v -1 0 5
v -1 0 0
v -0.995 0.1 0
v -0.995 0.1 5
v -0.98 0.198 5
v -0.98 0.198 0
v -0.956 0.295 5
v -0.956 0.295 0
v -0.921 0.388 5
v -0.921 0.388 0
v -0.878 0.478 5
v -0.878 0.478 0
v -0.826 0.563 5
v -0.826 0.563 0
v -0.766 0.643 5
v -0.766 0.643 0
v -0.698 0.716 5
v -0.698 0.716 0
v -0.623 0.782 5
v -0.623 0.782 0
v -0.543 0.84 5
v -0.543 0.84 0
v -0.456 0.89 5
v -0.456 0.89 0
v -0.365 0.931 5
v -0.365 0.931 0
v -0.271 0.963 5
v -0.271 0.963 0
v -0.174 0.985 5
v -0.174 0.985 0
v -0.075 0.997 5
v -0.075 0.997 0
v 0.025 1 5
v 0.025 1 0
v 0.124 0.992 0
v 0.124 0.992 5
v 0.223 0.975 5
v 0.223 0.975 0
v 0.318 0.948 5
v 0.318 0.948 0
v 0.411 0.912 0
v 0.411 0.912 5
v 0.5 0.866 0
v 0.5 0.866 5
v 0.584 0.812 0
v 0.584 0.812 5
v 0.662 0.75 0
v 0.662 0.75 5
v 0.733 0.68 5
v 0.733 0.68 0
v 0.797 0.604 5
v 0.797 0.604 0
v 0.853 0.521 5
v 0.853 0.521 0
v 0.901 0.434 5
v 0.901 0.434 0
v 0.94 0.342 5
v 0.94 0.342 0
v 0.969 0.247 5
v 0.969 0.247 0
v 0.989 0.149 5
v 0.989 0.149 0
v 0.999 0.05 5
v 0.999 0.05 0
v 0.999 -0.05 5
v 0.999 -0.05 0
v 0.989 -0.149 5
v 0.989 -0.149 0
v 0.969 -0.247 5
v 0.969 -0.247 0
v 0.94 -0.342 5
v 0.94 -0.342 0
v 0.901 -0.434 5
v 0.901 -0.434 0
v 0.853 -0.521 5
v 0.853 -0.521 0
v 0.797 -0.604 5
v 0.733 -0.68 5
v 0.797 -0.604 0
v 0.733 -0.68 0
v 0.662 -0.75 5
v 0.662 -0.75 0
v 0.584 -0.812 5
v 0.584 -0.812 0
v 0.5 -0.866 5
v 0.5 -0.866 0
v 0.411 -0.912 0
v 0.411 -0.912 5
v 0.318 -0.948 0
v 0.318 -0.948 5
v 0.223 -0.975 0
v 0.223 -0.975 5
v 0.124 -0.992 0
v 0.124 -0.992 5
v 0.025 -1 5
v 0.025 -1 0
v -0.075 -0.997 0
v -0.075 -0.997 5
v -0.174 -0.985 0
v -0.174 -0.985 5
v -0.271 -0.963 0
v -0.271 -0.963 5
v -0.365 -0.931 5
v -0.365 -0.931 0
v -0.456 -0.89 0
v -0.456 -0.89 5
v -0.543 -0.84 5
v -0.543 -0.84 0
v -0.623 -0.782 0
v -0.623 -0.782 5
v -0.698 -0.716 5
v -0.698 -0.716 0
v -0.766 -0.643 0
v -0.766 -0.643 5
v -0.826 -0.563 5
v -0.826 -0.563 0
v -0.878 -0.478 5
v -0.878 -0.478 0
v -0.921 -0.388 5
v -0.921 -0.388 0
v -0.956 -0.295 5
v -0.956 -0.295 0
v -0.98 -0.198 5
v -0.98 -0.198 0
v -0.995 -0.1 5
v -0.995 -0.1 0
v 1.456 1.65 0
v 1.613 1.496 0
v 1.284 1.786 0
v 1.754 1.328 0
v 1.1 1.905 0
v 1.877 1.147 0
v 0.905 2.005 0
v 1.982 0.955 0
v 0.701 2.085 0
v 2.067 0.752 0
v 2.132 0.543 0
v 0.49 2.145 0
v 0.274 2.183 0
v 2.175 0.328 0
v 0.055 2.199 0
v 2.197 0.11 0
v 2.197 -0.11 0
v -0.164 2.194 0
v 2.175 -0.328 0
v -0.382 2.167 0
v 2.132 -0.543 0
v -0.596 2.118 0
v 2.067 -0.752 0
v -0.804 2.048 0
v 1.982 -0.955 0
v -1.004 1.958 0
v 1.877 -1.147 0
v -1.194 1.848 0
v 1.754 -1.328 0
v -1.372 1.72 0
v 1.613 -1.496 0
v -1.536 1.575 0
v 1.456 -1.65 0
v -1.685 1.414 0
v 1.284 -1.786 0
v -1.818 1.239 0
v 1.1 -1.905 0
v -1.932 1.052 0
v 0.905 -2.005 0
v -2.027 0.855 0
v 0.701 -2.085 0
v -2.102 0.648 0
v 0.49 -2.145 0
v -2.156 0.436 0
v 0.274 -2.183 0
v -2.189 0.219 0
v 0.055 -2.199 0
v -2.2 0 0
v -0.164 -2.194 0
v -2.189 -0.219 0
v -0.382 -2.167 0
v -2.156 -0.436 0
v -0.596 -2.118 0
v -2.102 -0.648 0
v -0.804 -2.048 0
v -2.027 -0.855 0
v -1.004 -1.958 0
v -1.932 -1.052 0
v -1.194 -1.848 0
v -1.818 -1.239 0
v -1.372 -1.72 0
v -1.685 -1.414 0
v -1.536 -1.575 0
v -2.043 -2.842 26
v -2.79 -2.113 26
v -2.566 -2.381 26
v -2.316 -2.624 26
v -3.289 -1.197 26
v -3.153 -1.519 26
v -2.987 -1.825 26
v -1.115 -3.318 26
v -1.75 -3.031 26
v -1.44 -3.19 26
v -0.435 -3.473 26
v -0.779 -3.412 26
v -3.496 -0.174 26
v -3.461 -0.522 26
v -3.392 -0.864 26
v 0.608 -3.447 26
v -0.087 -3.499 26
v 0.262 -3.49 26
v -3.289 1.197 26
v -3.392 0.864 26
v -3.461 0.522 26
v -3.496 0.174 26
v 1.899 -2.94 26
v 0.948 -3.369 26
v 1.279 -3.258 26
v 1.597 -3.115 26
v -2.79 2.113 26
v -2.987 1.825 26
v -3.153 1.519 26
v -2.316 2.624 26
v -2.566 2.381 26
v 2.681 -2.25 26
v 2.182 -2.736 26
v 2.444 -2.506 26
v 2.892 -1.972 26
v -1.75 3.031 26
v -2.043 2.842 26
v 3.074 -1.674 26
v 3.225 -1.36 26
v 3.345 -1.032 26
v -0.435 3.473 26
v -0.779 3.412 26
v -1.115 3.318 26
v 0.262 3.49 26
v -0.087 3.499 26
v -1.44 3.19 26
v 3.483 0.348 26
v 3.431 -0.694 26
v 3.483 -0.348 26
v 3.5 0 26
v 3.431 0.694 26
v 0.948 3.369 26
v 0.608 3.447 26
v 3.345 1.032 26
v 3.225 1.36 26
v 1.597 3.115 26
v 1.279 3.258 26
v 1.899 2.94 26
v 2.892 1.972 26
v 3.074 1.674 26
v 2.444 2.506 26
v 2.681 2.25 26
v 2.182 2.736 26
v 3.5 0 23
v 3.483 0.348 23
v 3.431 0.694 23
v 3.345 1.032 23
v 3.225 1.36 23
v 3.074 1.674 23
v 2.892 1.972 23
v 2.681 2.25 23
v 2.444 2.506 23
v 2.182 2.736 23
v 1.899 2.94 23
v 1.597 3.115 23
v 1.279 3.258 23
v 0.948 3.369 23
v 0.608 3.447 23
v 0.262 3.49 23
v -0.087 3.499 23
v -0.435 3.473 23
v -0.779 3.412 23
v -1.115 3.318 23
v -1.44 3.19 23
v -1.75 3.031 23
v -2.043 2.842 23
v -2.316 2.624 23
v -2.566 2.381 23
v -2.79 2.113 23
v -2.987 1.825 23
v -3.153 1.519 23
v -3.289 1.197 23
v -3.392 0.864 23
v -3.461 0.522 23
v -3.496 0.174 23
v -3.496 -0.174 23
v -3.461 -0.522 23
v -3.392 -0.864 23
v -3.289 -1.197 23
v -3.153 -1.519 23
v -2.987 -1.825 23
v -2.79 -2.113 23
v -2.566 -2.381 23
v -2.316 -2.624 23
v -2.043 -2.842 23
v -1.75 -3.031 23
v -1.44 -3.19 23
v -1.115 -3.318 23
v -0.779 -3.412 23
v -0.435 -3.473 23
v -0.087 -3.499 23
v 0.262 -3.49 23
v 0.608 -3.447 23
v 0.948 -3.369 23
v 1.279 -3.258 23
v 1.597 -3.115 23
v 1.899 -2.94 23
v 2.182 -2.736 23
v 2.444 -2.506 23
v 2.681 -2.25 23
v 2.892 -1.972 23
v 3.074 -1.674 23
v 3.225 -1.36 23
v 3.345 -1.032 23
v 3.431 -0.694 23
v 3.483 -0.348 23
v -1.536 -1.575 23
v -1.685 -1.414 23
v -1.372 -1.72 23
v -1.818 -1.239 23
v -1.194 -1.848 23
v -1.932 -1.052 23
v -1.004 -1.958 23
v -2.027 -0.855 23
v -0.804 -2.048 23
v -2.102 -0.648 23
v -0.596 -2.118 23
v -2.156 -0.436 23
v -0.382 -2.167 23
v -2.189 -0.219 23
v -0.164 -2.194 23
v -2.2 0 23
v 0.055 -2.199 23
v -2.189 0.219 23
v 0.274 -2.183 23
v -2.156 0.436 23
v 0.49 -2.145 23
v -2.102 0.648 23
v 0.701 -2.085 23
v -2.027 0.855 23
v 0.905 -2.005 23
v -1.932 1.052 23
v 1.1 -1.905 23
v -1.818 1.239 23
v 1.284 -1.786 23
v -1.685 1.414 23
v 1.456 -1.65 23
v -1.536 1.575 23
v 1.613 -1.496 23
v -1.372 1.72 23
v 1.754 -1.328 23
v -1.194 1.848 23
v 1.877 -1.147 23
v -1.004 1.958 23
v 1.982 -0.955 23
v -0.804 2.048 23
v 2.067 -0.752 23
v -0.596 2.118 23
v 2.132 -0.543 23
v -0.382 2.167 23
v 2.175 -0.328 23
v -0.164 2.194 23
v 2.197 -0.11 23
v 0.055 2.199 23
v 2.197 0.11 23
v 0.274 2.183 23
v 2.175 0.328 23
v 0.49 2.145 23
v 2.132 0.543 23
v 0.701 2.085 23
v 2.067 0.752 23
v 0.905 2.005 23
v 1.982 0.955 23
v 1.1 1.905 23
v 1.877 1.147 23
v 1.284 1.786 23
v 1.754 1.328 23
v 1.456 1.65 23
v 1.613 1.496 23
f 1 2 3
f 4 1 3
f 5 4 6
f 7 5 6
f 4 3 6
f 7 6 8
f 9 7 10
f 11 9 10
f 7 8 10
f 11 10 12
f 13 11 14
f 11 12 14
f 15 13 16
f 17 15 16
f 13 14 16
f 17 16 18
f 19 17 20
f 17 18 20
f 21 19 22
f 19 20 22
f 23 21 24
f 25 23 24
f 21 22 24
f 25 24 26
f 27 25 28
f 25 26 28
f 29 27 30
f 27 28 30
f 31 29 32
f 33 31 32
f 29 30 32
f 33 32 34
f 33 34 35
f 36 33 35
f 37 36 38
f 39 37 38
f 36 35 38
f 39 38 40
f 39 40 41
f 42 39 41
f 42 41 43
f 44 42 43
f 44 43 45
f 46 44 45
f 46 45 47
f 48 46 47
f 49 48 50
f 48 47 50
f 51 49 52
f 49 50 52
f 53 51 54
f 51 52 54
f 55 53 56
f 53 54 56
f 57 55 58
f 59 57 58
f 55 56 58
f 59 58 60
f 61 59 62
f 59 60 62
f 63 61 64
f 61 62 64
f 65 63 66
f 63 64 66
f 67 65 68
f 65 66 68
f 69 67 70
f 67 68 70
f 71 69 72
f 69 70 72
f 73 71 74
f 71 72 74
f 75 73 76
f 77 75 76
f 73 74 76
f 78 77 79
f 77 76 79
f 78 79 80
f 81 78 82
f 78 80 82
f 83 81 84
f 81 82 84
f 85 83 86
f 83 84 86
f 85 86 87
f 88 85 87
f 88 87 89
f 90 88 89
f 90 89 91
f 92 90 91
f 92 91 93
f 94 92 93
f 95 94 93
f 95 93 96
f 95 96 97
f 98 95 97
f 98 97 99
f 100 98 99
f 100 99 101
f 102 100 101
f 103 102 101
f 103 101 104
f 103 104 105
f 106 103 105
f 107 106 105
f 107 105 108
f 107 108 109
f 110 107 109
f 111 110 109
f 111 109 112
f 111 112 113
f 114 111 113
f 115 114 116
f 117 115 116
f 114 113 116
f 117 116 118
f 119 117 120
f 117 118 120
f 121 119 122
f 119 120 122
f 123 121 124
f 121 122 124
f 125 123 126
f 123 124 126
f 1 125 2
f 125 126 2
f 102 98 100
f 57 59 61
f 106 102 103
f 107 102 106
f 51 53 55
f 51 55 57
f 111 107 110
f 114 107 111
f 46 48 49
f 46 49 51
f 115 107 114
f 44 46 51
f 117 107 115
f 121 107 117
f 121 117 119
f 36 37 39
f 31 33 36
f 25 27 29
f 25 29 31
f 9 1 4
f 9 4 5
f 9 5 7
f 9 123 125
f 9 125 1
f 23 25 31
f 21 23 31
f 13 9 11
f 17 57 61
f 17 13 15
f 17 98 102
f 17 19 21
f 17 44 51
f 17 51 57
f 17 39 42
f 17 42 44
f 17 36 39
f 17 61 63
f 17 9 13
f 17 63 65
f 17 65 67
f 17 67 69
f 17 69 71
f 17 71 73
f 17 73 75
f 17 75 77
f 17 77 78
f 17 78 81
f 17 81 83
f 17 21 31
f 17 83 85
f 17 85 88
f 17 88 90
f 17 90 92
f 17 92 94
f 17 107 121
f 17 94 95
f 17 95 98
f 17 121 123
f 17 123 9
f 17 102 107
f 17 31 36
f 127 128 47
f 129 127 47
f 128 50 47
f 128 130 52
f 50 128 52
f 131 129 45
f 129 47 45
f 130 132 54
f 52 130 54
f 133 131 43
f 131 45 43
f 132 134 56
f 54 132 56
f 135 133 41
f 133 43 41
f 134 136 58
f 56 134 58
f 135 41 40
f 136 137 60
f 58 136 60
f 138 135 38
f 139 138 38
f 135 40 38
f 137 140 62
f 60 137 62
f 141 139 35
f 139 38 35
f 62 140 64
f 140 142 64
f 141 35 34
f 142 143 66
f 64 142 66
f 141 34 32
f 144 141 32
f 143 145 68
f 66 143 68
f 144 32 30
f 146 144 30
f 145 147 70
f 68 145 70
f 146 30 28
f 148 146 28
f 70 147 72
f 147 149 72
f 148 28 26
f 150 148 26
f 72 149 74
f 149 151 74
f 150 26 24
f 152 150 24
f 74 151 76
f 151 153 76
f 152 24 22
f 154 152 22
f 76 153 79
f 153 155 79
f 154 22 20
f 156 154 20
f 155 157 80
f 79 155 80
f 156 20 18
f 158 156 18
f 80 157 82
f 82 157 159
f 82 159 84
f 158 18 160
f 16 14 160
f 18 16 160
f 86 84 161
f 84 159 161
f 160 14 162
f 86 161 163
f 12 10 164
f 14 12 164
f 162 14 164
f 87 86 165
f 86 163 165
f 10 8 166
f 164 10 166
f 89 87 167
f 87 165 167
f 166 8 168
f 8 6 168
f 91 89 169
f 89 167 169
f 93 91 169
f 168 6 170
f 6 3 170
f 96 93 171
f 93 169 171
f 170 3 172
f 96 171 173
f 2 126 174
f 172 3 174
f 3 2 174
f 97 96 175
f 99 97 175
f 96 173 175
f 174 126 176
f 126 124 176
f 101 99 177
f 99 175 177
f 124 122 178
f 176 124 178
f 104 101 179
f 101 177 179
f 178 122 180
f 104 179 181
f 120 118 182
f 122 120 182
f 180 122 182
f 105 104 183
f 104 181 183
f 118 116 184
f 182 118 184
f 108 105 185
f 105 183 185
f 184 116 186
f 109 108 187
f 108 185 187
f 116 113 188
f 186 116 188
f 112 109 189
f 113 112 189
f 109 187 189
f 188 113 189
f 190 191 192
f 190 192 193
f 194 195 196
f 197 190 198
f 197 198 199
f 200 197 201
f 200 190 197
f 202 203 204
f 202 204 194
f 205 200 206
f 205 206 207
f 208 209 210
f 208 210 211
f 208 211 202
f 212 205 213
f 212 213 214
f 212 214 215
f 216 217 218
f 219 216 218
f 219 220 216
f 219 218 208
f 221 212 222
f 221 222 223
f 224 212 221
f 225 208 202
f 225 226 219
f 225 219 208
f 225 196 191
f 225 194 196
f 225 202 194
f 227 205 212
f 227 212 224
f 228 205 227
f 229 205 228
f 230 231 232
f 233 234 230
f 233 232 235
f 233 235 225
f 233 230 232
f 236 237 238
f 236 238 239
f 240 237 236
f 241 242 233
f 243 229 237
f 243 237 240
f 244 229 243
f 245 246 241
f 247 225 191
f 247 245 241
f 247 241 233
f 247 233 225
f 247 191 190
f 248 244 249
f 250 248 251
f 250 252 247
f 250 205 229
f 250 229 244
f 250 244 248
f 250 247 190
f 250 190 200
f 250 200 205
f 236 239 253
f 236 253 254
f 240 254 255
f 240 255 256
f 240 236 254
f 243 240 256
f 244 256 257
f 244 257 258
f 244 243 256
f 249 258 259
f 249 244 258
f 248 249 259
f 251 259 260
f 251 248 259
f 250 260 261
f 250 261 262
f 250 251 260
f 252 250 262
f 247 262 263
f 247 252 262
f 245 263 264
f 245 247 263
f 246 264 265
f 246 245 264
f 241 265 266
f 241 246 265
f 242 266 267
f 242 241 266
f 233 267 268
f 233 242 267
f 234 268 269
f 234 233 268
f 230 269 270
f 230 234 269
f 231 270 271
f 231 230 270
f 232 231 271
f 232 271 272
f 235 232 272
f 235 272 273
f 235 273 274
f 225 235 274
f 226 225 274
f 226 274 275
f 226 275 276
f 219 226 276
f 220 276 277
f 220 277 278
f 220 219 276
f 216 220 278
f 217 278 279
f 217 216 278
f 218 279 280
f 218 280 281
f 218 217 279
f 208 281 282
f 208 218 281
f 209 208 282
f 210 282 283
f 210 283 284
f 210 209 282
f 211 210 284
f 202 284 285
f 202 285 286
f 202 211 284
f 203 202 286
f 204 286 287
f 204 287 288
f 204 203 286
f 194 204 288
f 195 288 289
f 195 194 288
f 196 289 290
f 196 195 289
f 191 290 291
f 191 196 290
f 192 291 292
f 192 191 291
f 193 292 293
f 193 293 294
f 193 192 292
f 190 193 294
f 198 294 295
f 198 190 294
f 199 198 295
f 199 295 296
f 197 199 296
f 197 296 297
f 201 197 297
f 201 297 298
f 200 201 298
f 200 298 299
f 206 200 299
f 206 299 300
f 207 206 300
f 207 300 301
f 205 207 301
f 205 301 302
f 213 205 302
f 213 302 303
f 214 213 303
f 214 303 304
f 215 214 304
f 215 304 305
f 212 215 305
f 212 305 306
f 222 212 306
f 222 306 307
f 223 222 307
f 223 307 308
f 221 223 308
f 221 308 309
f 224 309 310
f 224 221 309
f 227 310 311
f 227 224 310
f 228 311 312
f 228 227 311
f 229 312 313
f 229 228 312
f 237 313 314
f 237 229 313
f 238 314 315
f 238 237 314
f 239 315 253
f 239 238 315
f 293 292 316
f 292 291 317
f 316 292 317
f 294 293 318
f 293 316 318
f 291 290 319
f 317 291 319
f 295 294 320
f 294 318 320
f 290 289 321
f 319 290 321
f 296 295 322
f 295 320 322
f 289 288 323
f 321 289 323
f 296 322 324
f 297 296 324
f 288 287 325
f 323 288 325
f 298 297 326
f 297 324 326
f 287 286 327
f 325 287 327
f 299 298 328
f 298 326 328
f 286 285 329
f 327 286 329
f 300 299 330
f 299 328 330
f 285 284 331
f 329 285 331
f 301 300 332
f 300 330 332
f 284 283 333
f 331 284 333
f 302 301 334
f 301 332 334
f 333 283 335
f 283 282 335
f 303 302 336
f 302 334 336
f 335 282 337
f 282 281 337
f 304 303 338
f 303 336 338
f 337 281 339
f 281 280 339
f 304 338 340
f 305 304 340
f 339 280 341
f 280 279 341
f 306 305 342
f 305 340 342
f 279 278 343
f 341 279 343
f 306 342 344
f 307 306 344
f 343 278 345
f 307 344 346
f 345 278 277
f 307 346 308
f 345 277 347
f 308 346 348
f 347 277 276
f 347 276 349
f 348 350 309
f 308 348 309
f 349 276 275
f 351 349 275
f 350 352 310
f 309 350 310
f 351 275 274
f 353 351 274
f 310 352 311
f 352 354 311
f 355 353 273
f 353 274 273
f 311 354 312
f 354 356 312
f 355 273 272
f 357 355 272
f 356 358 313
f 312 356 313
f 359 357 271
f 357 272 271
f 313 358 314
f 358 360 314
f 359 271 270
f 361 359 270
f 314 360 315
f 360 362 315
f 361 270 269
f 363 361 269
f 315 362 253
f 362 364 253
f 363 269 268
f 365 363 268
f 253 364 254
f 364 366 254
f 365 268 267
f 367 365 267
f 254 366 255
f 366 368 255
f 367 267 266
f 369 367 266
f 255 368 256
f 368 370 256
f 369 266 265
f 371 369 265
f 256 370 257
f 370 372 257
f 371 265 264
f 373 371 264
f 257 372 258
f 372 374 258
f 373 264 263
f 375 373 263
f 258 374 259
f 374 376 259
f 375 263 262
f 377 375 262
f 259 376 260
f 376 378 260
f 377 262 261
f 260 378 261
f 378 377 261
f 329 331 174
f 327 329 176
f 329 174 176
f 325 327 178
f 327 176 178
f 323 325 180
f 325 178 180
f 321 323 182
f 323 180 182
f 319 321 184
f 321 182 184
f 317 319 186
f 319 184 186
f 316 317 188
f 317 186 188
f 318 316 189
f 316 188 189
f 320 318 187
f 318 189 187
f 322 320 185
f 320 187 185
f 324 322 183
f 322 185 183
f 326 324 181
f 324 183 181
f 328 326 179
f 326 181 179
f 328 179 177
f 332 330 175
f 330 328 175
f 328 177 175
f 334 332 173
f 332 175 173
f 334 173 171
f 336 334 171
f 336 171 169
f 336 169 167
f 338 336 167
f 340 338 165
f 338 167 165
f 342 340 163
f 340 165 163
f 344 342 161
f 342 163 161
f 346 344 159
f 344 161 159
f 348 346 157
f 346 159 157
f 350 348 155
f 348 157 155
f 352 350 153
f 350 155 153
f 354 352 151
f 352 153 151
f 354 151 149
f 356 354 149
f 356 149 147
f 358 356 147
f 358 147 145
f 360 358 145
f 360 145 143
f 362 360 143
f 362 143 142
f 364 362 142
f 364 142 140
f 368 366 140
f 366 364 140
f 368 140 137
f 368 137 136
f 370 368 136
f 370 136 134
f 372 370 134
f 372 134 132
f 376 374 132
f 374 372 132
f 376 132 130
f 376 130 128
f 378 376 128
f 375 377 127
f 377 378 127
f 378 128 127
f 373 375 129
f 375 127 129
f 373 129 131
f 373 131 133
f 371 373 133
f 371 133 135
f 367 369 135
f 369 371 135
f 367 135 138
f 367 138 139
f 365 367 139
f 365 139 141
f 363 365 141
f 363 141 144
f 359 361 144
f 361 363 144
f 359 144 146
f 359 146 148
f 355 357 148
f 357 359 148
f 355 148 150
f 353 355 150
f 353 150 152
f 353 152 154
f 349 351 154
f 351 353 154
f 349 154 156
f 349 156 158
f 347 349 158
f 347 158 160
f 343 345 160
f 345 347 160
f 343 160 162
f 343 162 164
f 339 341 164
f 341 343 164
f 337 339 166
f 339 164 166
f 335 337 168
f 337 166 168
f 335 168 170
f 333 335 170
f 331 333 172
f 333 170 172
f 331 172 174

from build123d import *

# Parameters (mm, degrees)
SKETCH1_R           = 2.2
BOSS_EXTRUDE1_DEPTH = 26
SKETCH2_R           = 3.5
BOSS_EXTRUDE2_DEPTH = 3
SKETCH3_R           = 1
CUT_EXTRUDE1_DEPTH  = 5


with BuildPart() as part:
    # Sketch1 → Boss-Extrude1 (new body)
    with BuildSketch(Plane.XY):
        with Locations(Location((0, 0, 0), (0, 0, 180))):
            Circle(SKETCH1_R)
    extrude(amount=BOSS_EXTRUDE1_DEPTH)

    # Sketch2 → Boss-Extrude2 (add)
    with BuildSketch(Plane.XY.offset(26)):
        Circle(SKETCH2_R)
    extrude(amount=-BOSS_EXTRUDE2_DEPTH)

    # Sketch3 → Cut-Extrude1 (cut)
    with BuildSketch(Plane(origin=(0, 0, 0), x_dir=(-1, 0, 0), z_dir=(0, 0, -1))):
        Circle(SKETCH3_R)
    extrude(amount=-CUT_EXTRUDE1_DEPTH, mode=Mode.SUBTRACT)


solid = part.part
